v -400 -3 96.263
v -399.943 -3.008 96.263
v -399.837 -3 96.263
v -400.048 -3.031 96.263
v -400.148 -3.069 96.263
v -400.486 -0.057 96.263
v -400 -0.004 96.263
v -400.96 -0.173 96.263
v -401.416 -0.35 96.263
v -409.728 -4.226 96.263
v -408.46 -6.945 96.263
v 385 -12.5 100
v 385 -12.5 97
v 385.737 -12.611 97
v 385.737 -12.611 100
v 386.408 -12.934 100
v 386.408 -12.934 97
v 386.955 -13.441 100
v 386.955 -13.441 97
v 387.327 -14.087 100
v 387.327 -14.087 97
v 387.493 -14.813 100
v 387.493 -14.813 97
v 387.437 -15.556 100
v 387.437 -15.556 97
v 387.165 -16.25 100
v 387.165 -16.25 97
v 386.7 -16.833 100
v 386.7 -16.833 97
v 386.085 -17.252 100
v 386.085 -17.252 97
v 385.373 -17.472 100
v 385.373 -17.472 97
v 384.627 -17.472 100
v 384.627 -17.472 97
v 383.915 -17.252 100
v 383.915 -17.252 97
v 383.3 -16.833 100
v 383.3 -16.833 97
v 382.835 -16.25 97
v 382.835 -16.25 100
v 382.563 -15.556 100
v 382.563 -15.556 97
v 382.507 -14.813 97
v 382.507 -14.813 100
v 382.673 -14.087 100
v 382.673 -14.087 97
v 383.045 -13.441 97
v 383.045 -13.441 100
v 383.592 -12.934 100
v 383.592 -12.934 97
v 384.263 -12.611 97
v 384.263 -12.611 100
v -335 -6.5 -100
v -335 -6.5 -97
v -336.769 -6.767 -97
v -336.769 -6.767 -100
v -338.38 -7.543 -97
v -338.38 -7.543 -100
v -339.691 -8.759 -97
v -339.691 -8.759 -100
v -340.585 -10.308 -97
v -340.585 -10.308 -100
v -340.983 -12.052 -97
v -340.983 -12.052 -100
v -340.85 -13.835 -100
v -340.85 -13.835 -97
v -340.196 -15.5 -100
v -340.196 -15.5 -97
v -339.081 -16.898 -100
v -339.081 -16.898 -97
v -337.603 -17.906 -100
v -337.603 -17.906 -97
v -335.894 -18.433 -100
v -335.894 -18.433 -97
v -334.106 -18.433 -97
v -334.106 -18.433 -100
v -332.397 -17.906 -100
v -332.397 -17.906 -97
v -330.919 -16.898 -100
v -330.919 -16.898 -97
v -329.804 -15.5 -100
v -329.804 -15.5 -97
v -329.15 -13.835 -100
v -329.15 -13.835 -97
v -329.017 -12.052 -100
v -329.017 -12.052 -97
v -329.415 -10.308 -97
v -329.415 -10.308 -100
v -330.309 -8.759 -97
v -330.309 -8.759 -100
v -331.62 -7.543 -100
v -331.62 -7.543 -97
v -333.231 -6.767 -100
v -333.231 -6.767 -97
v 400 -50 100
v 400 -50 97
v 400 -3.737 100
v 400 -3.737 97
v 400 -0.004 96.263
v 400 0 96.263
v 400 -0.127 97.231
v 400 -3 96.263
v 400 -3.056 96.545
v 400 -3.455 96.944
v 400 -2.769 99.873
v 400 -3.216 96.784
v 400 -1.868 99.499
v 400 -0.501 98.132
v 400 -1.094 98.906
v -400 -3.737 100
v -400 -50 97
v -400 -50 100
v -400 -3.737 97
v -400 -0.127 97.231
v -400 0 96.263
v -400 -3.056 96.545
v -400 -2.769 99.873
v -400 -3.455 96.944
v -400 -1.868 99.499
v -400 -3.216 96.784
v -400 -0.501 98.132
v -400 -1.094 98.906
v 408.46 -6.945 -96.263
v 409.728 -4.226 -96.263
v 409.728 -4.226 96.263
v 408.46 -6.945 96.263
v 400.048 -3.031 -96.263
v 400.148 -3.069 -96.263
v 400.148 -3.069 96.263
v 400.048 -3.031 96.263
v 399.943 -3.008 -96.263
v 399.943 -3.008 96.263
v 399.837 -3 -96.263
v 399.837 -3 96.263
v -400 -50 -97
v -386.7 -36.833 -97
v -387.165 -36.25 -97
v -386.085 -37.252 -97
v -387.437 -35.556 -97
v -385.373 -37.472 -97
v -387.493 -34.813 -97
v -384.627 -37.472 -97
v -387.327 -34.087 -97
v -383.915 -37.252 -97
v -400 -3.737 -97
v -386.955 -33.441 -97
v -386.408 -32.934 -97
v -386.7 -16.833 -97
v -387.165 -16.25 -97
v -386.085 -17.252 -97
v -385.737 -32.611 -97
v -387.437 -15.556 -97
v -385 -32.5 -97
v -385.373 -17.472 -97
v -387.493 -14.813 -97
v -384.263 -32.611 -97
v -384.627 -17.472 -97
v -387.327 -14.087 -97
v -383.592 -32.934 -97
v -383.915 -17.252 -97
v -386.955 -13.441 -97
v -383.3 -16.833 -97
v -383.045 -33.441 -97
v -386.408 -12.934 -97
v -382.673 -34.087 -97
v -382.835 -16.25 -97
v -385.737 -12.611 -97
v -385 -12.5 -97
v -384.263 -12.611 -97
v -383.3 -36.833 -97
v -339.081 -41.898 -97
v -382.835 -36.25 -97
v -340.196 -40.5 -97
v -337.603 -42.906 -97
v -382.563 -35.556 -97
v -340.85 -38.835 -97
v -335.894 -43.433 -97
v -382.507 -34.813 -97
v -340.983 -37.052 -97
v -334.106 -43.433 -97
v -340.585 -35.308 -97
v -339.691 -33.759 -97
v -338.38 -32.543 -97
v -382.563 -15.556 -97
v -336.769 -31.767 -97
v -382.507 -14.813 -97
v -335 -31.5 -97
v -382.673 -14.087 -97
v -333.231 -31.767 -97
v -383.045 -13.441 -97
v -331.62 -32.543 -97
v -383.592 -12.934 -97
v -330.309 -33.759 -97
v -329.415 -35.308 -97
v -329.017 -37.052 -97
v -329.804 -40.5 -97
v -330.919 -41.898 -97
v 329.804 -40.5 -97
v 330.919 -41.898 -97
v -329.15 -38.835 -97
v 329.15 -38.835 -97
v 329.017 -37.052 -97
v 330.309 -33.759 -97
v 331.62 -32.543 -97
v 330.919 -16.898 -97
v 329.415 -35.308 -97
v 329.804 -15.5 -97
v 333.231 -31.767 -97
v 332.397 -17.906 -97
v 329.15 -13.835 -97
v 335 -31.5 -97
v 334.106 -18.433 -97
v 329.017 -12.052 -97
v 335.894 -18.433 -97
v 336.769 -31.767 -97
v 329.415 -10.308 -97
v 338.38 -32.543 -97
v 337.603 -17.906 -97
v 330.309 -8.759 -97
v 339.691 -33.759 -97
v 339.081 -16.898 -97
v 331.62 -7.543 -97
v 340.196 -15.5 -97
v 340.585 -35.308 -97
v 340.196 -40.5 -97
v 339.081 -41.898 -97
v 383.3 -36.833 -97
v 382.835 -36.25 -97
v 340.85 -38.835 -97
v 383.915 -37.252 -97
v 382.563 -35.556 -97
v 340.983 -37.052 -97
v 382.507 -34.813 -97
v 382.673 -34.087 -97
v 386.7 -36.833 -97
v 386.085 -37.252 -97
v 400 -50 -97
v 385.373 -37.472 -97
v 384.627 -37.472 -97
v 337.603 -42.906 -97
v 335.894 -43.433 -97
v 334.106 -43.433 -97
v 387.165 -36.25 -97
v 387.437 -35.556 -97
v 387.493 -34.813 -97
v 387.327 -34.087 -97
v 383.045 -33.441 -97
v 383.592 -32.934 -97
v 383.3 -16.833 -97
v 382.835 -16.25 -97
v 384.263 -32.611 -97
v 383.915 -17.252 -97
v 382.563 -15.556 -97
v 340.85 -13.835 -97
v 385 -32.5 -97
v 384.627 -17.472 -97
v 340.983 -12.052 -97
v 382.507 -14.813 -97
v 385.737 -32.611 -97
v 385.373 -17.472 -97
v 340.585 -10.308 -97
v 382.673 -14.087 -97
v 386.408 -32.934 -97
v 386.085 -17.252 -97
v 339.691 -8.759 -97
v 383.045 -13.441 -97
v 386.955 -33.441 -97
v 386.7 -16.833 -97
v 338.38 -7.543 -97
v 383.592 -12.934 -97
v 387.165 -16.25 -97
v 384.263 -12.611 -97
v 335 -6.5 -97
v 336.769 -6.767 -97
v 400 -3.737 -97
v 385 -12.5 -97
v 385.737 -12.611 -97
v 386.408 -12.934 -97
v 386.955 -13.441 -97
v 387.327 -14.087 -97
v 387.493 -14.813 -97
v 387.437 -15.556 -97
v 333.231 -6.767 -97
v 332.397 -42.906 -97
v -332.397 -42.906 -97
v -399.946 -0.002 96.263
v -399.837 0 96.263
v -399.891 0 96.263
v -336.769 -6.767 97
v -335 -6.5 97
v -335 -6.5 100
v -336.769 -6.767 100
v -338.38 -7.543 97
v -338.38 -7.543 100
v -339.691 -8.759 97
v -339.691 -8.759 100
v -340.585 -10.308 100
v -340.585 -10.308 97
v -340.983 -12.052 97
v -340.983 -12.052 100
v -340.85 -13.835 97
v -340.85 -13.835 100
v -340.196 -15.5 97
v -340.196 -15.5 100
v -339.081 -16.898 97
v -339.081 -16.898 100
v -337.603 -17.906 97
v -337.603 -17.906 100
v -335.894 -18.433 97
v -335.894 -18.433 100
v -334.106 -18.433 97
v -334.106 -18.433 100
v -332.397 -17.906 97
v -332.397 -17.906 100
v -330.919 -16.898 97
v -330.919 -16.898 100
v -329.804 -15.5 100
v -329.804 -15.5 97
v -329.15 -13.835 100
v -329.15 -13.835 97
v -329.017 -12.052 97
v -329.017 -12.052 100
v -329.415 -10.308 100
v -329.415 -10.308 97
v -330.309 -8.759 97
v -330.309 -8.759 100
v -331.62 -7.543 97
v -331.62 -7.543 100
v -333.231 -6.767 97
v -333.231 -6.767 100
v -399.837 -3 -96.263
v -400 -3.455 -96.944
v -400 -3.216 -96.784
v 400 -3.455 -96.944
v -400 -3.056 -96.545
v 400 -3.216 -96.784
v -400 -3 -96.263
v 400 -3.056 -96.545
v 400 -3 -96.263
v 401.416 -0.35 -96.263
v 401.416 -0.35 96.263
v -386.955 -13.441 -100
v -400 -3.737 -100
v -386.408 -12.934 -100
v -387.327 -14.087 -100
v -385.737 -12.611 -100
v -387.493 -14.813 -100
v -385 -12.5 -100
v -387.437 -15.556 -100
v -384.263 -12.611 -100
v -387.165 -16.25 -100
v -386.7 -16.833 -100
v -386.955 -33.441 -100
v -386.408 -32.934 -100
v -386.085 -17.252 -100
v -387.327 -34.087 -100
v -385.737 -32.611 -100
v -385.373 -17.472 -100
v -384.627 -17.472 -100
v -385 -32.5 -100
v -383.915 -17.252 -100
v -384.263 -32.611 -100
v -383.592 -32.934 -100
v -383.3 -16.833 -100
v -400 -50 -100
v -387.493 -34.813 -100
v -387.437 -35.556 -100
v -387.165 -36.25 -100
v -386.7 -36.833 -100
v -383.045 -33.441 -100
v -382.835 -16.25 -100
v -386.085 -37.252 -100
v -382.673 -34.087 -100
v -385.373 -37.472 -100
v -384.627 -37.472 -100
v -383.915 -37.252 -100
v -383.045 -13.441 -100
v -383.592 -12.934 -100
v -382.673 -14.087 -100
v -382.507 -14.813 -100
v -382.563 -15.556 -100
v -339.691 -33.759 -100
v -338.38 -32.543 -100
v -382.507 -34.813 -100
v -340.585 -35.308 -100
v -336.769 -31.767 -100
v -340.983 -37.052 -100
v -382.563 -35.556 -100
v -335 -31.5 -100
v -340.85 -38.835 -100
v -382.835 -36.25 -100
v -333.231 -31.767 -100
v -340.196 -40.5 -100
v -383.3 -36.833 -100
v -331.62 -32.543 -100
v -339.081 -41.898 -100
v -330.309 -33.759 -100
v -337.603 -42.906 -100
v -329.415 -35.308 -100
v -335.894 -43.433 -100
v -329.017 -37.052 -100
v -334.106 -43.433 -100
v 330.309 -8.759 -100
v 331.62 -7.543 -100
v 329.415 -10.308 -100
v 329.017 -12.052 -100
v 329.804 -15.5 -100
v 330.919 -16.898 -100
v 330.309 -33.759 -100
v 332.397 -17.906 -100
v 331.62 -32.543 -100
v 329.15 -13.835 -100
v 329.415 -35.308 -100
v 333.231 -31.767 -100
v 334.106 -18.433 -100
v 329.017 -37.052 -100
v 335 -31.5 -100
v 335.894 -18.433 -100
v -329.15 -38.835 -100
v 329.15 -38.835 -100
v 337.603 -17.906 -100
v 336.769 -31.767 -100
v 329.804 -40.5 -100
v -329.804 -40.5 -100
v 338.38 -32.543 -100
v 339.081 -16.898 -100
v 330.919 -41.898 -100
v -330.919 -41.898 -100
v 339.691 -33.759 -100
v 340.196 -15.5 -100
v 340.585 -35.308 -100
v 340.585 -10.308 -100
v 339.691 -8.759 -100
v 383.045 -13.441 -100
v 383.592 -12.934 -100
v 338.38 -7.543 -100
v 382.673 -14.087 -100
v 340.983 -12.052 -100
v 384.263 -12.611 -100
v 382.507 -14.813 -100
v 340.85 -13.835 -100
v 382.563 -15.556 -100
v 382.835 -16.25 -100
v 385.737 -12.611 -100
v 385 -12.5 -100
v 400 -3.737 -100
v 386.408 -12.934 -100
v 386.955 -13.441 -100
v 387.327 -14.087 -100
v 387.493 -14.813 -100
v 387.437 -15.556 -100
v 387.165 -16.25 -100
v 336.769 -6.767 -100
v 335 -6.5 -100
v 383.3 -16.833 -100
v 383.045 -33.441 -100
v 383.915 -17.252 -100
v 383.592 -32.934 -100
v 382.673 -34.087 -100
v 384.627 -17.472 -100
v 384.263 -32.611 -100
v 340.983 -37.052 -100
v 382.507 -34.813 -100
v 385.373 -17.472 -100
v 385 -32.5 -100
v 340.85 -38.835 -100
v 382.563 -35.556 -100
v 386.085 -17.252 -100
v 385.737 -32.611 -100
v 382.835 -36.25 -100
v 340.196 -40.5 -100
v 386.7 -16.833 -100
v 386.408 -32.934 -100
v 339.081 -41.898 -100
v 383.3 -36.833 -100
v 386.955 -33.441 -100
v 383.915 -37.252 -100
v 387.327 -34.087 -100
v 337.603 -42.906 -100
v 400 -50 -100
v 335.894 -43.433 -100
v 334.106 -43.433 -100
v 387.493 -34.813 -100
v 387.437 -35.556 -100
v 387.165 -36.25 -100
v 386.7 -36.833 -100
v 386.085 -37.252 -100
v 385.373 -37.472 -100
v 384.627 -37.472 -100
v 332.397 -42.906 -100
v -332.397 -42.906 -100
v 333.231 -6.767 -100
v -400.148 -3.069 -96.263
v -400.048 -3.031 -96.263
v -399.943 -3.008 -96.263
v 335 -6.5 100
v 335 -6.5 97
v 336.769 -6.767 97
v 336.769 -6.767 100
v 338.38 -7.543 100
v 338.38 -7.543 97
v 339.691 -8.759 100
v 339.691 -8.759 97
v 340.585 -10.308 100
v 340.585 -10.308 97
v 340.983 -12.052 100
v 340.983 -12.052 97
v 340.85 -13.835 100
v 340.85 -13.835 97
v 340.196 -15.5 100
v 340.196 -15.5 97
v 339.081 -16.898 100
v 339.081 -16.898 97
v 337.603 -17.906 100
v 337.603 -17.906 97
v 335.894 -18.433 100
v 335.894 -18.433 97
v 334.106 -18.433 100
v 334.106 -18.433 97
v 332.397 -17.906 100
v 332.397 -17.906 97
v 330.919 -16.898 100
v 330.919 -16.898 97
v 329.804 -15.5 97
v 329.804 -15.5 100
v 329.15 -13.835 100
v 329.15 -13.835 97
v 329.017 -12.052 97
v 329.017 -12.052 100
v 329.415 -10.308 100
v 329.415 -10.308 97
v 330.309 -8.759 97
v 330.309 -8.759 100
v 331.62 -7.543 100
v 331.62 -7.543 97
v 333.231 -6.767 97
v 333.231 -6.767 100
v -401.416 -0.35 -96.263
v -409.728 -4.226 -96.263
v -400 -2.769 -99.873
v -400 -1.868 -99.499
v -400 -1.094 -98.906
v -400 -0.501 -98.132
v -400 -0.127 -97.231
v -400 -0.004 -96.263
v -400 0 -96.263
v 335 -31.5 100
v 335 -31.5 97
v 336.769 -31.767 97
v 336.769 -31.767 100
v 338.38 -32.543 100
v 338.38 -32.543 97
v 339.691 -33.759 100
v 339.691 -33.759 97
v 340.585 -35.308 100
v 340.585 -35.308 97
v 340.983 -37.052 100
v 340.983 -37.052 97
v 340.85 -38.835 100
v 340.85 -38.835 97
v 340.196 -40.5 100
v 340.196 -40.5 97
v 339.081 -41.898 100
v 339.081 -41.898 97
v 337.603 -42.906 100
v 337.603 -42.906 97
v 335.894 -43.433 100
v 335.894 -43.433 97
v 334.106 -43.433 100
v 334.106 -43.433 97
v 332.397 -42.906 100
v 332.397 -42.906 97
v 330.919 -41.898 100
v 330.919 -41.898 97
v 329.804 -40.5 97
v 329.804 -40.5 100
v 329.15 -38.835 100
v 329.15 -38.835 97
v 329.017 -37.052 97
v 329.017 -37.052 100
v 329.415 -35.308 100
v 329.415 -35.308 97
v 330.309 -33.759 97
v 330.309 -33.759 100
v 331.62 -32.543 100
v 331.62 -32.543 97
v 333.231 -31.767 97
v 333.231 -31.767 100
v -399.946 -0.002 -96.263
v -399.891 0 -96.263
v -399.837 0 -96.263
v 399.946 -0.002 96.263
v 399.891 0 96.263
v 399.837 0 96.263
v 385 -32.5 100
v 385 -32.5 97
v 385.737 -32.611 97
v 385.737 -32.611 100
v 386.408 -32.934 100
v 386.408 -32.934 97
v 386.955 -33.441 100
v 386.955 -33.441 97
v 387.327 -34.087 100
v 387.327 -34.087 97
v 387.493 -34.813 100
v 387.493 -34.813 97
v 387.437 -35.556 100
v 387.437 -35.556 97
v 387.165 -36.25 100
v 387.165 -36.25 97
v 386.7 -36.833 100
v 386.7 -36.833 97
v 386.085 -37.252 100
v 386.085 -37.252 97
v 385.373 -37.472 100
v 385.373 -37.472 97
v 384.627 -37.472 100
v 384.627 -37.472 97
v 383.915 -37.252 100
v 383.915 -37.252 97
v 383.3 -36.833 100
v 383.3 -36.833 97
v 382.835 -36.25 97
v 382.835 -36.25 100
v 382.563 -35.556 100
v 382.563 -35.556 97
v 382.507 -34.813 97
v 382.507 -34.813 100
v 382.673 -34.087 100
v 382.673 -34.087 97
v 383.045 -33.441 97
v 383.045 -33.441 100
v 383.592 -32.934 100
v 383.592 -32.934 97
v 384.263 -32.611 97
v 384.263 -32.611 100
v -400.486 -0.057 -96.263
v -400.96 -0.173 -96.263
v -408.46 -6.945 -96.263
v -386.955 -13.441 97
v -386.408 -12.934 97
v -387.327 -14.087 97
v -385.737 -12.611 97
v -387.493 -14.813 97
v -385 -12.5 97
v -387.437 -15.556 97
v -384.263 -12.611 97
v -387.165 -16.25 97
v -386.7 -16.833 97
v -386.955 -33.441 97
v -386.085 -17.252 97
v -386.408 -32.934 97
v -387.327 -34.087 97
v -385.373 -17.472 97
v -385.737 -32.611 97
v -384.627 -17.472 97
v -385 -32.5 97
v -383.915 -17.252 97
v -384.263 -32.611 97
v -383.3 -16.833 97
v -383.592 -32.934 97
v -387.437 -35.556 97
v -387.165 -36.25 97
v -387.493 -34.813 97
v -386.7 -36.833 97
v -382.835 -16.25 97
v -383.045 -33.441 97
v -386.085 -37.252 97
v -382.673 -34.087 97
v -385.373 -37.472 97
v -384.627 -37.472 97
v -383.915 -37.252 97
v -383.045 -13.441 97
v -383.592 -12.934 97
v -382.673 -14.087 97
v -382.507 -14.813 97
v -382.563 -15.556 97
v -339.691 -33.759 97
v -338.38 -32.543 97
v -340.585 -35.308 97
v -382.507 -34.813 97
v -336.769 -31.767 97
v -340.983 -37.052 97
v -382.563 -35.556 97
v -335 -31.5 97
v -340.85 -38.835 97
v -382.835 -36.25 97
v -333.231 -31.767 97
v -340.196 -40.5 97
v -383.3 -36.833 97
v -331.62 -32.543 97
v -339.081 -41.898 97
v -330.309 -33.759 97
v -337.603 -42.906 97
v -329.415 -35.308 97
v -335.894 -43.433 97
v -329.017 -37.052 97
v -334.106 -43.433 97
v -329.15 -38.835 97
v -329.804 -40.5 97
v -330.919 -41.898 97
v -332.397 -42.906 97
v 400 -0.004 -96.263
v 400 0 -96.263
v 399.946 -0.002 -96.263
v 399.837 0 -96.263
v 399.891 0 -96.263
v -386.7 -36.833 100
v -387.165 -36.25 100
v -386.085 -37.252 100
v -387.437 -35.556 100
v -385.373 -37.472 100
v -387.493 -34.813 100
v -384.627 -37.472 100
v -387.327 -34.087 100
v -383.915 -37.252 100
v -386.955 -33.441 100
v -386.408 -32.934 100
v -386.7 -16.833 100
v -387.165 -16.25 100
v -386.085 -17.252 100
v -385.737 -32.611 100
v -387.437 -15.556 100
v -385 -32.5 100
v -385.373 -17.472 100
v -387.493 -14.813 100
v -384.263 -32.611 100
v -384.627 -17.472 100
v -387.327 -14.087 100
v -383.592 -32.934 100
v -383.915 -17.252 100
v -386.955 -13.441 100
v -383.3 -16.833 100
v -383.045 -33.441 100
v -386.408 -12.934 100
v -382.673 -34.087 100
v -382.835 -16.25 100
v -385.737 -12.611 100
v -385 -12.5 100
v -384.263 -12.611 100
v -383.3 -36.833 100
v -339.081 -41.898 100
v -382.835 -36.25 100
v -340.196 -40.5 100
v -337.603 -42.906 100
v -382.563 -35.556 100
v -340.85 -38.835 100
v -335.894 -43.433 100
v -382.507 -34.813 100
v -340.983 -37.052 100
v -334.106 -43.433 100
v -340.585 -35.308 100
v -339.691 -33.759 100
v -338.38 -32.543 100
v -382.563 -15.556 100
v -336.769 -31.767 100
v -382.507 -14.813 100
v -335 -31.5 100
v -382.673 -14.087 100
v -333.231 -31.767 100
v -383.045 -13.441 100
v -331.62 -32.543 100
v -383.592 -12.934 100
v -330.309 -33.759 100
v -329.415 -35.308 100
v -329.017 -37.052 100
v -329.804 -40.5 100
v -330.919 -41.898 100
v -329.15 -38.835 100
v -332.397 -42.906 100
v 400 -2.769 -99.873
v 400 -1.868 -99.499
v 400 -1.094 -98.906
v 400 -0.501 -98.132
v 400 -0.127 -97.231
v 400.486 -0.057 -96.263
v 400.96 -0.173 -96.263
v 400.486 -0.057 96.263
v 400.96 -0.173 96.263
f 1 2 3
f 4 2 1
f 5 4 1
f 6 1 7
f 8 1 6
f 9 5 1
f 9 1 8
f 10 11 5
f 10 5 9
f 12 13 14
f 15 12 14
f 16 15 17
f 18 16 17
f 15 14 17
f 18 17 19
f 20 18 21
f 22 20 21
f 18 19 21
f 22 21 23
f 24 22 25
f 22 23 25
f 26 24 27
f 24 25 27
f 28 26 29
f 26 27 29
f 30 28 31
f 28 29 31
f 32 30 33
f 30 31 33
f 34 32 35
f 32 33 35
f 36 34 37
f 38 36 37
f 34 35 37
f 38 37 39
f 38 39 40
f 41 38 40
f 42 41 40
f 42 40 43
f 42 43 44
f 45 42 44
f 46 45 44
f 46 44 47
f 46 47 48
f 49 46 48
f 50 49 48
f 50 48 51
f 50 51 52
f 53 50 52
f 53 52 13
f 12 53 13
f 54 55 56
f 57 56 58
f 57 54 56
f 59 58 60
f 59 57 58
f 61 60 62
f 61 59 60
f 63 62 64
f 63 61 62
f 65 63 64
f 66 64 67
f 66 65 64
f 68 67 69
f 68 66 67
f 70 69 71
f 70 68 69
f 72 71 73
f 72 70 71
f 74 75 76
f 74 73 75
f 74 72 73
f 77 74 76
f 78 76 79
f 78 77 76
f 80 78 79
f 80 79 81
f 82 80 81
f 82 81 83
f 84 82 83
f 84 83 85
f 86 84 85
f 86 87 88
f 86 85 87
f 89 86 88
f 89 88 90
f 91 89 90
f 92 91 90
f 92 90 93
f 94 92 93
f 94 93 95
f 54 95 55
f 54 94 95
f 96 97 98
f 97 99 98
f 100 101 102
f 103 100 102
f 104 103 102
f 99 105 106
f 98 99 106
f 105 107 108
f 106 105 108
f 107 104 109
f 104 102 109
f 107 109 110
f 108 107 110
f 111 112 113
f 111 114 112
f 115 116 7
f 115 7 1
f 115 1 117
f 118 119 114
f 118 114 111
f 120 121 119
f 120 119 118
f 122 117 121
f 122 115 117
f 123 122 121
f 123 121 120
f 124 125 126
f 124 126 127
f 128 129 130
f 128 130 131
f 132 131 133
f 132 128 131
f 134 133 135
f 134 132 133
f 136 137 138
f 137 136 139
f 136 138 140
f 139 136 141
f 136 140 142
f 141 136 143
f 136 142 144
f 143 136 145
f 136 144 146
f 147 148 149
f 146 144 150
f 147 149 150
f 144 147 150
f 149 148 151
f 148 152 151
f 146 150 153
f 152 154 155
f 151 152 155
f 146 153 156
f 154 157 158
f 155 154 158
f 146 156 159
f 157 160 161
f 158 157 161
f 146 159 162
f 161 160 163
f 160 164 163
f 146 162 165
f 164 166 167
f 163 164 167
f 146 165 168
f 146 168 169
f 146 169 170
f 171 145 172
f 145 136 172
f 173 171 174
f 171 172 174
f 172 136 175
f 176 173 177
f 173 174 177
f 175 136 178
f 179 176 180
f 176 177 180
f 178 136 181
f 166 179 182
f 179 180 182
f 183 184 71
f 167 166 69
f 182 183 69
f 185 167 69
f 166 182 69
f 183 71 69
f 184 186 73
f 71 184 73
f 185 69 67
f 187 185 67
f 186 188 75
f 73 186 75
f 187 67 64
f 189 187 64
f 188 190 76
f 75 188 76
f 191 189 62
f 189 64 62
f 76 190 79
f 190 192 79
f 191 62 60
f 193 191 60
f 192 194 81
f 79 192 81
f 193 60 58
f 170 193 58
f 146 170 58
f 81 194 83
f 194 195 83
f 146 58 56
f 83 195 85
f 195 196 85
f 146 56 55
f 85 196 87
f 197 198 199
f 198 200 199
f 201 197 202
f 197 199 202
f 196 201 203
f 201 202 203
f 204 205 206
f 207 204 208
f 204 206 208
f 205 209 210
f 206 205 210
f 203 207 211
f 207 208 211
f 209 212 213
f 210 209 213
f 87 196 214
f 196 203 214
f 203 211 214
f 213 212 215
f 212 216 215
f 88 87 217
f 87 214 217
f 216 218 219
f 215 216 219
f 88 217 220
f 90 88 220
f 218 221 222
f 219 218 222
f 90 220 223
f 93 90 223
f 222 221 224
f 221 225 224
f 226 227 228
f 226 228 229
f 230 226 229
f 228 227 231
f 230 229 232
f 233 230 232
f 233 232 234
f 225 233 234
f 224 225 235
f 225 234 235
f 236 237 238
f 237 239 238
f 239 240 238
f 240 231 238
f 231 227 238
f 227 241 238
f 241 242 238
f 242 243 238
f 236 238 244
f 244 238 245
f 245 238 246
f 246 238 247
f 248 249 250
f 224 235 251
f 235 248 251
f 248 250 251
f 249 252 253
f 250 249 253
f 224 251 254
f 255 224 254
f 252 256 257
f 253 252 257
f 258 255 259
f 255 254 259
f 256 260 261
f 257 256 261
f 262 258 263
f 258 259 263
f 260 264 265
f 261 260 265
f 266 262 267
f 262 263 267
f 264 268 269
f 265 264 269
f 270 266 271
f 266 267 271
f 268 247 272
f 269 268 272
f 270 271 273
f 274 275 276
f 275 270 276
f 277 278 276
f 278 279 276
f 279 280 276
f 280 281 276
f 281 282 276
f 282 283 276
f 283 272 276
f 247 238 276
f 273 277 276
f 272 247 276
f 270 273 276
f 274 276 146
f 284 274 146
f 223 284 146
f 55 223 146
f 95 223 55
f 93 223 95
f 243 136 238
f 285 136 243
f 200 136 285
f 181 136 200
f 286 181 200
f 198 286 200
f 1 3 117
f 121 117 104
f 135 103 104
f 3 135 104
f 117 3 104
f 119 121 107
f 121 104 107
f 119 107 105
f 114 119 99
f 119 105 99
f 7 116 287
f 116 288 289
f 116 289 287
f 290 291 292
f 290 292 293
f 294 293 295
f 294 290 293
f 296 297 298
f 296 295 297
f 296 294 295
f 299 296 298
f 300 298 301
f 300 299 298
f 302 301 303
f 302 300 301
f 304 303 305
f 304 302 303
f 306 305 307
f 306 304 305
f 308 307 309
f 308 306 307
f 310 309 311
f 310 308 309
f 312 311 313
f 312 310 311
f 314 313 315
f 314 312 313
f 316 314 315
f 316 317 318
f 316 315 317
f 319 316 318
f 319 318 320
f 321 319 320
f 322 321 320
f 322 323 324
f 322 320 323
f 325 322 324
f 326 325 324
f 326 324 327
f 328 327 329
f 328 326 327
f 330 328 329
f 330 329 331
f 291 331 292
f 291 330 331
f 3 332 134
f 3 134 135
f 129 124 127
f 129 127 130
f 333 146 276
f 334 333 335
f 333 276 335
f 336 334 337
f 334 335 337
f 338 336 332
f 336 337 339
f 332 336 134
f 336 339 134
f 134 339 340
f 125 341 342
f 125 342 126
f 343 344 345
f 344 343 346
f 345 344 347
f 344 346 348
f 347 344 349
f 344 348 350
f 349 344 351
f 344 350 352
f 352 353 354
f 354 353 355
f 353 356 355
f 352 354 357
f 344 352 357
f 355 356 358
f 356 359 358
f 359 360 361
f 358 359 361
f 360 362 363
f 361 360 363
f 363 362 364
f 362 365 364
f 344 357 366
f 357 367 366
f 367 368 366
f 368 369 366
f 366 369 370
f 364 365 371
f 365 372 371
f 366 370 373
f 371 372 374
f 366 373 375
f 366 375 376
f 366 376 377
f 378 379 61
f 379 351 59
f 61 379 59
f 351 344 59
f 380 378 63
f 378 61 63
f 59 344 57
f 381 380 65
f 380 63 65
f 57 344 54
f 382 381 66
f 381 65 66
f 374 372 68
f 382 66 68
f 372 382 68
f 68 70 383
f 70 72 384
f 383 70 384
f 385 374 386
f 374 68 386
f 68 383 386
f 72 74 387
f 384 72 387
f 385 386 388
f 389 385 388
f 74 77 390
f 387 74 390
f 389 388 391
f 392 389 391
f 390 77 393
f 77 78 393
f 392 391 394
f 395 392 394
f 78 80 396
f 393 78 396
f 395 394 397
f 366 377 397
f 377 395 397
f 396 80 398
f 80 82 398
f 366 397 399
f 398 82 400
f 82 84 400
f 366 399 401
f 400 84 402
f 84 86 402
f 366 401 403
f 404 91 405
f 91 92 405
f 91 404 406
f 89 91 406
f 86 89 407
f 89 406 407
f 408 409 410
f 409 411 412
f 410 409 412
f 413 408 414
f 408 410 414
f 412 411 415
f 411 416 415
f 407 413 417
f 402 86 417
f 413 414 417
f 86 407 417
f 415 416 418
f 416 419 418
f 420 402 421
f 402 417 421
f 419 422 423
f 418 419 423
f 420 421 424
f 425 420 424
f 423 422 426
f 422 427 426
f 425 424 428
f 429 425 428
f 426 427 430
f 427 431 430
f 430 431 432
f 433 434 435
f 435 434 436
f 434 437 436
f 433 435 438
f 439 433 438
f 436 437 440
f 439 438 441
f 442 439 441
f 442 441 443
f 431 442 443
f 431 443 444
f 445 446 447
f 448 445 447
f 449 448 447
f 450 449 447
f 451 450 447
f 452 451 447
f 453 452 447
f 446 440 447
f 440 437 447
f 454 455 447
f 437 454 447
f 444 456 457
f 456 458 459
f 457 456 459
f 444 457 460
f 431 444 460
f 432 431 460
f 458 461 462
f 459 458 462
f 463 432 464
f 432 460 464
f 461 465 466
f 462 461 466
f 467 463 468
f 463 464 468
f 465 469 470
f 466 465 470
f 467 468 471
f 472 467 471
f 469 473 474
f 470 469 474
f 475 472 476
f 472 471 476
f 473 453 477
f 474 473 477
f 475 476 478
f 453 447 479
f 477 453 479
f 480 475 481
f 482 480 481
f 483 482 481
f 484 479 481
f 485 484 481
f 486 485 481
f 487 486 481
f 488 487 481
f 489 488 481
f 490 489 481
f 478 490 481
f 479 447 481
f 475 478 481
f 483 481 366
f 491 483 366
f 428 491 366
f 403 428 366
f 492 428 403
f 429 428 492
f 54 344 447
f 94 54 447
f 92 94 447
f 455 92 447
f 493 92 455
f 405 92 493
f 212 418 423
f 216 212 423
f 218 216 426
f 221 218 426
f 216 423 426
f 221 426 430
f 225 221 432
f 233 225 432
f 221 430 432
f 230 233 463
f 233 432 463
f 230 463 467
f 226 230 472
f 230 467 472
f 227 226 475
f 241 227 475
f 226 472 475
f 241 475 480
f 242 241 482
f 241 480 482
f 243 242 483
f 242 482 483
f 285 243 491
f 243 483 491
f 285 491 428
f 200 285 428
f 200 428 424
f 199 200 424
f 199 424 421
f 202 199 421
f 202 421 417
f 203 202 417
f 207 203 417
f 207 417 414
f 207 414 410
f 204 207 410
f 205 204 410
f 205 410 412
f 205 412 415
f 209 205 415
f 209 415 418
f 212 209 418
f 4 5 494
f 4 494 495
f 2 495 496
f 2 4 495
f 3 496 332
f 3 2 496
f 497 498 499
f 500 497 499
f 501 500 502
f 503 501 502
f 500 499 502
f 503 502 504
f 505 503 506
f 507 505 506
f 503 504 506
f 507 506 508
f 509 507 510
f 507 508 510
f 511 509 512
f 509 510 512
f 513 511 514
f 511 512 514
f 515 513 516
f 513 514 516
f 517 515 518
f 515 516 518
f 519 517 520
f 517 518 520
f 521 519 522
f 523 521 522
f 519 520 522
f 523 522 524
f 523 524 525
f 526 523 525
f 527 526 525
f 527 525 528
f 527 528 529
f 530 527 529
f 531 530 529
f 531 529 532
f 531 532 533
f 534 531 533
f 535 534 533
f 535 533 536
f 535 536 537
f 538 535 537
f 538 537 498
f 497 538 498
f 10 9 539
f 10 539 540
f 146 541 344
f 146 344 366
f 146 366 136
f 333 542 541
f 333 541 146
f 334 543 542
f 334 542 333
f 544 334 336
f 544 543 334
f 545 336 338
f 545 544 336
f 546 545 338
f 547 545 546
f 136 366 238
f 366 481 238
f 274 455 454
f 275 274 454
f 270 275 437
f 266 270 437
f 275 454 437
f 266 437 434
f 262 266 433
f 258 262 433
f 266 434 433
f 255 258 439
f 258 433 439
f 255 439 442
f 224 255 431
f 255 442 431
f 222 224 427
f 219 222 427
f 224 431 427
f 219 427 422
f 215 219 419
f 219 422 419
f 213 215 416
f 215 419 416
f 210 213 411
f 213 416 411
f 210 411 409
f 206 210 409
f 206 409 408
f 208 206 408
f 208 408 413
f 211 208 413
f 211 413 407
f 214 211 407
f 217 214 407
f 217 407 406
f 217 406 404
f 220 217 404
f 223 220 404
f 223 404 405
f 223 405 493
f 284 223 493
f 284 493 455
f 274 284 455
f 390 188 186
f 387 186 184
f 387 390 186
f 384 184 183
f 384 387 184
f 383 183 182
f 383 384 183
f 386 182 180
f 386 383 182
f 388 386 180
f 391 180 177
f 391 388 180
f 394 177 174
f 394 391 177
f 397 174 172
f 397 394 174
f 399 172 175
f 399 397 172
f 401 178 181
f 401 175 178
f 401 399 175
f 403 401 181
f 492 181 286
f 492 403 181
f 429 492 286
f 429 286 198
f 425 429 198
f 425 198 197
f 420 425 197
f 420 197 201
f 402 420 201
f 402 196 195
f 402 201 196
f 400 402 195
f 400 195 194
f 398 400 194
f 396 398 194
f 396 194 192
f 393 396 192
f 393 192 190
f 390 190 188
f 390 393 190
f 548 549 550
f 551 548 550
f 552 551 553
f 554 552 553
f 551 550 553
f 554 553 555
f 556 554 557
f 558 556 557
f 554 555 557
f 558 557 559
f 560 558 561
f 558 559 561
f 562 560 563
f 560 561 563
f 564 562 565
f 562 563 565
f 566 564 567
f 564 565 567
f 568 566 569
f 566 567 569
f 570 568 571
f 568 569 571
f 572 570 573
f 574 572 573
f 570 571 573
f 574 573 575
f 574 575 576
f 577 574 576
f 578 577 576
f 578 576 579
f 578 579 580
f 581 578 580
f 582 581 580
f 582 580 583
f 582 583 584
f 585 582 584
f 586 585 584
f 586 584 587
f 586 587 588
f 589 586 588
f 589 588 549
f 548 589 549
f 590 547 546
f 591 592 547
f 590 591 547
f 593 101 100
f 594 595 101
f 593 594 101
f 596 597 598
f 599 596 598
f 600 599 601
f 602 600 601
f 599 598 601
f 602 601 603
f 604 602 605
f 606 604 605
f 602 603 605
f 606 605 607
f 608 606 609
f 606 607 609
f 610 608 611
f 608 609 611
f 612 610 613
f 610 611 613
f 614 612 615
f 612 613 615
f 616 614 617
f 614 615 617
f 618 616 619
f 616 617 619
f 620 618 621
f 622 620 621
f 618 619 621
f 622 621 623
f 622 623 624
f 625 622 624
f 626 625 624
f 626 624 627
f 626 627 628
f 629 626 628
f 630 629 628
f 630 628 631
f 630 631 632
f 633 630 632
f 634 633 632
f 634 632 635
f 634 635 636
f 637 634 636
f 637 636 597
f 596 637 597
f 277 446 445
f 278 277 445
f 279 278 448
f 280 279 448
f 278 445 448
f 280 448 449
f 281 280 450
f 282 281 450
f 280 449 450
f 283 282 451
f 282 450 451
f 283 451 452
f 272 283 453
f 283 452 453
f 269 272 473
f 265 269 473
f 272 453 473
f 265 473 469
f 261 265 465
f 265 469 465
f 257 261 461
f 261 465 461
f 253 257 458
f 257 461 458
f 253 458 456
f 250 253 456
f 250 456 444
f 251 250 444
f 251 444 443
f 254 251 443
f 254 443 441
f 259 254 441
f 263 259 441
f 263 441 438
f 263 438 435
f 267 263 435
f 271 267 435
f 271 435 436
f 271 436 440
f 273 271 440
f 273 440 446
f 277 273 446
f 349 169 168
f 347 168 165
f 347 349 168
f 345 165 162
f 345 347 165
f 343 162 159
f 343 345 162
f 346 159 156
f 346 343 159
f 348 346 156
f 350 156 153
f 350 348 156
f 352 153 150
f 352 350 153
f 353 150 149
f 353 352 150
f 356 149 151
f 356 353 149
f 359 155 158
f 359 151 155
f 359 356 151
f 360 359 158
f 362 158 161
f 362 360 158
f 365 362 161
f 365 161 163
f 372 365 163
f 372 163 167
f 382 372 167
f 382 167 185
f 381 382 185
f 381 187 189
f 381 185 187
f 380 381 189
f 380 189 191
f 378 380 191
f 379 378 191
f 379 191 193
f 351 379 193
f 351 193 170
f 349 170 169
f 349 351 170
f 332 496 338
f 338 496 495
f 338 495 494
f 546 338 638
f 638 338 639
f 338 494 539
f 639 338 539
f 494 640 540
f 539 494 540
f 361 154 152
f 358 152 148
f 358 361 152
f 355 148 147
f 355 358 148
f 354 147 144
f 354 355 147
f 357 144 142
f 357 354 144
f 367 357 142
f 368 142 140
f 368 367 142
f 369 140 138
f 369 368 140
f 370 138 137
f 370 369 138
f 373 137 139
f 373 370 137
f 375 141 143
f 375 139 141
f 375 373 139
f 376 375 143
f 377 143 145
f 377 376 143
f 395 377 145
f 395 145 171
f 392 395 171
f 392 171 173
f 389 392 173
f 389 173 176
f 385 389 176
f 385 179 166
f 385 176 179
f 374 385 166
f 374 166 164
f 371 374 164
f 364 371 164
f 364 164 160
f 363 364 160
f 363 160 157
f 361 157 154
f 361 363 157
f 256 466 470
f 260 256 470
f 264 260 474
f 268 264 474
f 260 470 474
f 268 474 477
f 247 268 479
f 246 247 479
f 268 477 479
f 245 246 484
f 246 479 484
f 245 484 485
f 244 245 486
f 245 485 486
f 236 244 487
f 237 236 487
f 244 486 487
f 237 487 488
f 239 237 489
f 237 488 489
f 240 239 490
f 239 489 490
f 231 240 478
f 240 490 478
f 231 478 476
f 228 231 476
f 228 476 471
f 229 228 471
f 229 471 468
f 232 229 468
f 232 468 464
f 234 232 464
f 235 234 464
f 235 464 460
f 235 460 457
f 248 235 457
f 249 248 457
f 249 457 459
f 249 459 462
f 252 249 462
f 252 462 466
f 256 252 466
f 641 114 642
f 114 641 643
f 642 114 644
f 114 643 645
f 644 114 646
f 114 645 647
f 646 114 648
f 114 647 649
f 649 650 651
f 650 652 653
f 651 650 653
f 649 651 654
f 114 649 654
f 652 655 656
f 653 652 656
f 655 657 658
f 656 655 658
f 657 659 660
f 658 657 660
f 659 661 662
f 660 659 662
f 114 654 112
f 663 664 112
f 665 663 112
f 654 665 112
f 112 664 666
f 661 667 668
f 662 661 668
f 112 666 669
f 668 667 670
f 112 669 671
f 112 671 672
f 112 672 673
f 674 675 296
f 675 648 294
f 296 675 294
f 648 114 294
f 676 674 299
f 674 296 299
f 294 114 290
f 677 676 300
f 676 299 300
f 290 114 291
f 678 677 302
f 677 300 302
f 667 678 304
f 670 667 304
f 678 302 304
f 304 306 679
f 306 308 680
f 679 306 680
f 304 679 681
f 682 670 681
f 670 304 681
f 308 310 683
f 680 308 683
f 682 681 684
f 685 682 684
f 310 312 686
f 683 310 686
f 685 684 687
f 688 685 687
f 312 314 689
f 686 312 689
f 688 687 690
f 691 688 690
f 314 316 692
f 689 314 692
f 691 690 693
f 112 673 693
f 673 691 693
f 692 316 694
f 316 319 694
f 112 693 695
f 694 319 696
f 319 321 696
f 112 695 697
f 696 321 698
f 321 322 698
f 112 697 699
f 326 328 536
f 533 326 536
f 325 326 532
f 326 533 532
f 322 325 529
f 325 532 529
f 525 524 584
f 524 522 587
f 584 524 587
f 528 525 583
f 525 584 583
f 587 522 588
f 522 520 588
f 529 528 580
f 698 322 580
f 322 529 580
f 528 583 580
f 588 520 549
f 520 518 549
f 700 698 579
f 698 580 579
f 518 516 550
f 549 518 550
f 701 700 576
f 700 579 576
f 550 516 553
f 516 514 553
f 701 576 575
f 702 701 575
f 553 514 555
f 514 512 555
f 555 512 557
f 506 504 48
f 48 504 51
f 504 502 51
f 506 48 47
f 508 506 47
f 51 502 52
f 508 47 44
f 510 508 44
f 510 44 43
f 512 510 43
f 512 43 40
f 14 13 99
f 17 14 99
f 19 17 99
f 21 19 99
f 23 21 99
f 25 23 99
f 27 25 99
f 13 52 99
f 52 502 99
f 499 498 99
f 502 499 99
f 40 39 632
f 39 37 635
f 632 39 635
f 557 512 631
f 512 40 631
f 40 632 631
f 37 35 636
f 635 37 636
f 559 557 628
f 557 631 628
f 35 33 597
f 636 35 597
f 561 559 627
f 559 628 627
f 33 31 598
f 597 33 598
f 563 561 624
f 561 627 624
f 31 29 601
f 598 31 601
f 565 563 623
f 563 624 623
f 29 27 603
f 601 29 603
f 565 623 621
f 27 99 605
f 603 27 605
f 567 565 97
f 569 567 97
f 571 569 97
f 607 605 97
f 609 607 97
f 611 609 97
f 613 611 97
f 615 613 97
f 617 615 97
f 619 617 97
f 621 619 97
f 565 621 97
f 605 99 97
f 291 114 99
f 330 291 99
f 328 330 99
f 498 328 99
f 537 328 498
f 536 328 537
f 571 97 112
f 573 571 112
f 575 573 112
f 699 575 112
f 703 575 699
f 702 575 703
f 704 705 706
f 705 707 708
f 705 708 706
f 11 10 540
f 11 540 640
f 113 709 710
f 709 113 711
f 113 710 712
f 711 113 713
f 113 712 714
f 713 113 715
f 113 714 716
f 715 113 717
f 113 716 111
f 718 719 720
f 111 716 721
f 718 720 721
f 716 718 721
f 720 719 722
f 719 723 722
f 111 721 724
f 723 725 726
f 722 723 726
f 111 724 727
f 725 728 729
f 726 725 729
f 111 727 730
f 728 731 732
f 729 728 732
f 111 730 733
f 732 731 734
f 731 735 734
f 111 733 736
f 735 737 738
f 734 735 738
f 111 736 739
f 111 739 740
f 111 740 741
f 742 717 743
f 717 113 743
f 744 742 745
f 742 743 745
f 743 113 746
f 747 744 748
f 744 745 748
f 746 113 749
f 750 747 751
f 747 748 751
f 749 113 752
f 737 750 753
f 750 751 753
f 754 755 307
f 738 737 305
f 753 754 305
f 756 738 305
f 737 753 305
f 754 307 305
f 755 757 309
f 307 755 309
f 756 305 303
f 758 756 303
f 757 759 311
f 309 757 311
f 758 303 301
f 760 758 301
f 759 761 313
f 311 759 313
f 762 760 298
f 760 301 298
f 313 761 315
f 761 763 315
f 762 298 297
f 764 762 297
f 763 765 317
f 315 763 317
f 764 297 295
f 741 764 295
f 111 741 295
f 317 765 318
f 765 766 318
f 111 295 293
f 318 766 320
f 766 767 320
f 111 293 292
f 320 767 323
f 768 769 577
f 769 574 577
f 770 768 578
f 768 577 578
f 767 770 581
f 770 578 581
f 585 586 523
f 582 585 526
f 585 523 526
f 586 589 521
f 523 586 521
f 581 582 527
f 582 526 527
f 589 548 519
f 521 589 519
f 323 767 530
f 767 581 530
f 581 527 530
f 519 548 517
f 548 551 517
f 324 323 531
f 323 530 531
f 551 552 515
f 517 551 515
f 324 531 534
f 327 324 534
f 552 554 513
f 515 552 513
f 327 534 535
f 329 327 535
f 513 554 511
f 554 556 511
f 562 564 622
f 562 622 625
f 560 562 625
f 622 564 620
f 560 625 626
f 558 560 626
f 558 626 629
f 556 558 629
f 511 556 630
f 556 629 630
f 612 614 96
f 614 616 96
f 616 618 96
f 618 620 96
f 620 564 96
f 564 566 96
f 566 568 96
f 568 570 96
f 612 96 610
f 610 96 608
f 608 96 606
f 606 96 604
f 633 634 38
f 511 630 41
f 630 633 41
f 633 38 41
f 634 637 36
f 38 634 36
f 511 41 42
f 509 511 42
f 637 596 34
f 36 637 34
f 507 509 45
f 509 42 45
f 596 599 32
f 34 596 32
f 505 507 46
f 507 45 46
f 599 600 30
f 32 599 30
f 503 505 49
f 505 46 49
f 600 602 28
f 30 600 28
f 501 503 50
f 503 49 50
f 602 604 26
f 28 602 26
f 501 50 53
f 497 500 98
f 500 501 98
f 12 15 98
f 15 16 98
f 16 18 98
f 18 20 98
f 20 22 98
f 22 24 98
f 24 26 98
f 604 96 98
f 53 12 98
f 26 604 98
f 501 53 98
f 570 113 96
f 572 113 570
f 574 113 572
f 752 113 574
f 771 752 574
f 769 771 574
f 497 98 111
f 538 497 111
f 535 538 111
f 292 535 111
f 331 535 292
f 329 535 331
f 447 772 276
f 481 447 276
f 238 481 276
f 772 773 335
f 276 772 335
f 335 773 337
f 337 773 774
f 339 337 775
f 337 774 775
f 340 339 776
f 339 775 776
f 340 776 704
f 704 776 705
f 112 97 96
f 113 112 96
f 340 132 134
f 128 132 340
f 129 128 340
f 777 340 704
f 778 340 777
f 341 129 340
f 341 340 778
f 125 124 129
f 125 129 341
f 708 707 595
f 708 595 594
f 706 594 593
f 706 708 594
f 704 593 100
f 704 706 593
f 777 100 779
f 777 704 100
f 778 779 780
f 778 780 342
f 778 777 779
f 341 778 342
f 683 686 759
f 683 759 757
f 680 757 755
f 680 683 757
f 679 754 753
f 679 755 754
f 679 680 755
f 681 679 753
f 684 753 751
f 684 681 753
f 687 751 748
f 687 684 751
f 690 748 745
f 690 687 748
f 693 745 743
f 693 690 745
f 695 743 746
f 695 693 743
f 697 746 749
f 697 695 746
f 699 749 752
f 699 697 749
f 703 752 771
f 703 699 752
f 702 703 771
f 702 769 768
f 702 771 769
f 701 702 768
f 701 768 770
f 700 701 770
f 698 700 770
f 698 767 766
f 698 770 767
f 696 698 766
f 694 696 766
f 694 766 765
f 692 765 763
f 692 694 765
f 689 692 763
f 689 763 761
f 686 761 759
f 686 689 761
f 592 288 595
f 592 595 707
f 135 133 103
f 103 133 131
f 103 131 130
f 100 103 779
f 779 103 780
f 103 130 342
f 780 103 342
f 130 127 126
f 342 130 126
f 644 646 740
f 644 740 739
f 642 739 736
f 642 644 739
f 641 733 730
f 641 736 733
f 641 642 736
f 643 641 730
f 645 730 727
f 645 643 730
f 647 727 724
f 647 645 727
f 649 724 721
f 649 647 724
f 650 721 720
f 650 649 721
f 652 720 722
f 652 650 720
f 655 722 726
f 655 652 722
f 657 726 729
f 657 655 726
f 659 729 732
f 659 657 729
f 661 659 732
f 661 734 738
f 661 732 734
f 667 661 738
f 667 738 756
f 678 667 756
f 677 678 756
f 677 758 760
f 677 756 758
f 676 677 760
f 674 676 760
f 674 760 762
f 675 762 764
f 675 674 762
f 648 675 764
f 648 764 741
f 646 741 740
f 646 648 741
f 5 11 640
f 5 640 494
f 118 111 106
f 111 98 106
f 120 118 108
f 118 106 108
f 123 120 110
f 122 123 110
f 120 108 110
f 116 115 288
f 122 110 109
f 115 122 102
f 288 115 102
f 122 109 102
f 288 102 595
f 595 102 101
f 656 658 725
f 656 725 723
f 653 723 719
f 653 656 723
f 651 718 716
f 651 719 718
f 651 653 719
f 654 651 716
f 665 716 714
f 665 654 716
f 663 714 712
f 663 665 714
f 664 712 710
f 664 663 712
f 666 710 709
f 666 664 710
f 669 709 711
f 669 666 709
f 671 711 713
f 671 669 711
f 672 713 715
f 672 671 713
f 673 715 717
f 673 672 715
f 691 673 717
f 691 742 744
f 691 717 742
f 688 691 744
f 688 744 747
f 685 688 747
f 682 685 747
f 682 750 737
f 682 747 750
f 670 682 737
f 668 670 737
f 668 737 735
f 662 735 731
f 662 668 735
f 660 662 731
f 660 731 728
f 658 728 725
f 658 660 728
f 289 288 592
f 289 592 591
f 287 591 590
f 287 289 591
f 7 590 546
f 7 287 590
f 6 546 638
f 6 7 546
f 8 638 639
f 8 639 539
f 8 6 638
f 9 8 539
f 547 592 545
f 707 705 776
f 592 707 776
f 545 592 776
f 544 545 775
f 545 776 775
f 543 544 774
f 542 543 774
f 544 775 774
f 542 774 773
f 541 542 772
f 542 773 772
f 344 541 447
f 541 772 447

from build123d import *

# Parameters (mm, degrees)
BASE_FLANGE1_DEPTH             = 400
SKETCH6_R                      = 2.5
CUT_EXTRUDE2_DEPTH             = 451
SKETCH10_R                     = 6
CUT_EXTRUDE1_DEPTH             = 451
KENAR_FLAN_1_STRIP_CUT_DEPTH   = 192.5268
KENAR_FLAN_1_STRIP_CUT_2_DEPTH = 192.5268
KENAR_FLAN_1_DEPTH             = 192.5268
KENAR_FLAN_1_BEND_DEPTH        = 192.5268


# Sheet-metal steps are written as plain solids
with BuildPart() as part:
    # Sketch1 → Base-Flange1 (new, symmetric)
    with BuildSketch(Plane(origin=(0, 0, 0), x_dir=(0, 0, -1), z_dir=(1, 0, 0))):
        with BuildLine():
            Line((-100, -50), (-100, -3.7366))
            ThreePointArc((-100, -3.7366), (-98.905575199, -1.094424801), (-96.2634, 0))
            Line((-96.2634, 0), (96.2634, 0))
            ThreePointArc((96.2634, 0), (98.905575199, -1.094424801), (100, -3.7366))
            Line((100, -3.7366), (100, -50))
            Line((100, -50), (97, -50))
            Line((97, -50), (97, -3.7366))
            ThreePointArc((97, -3.7366), (96.784254855, -3.215745145), (96.2634, -3))
            Line((96.2634, -3), (-96.2634, -3))
            ThreePointArc((-96.2634, -3), (-96.784254855, -3.215745145), (-97, -3.7366))
            Line((-97, -3.7366), (-97, -50))
            Line((-97, -50), (-100, -50))
        make_face()
    extrude(amount=BASE_FLANGE1_DEPTH, both=True)

    # Sketch6 → Cut-Extrude2 (cut, through all)
    with BuildSketch(Plane(origin=(0, 0, -100), x_dir=(-1, 0, 0), z_dir=(0, 0, -1))):
        with Locations(Location((-385, -15, 0), (0, 0, 90))):
            Circle(SKETCH6_R)
        with Locations(Location((-385, -35, 0), (0, 0, 90))):
            Circle(SKETCH6_R)
    cut_extrude2 = extrude(amount=-CUT_EXTRUDE2_DEPTH, mode=Mode.SUBTRACT)

    # Sketch10 → Cut-Extrude1 (cut, through all)
    with BuildSketch(Plane(origin=(0, 0, -100), x_dir=(-1, 0, 0), z_dir=(0, 0, -1))):
        with Locations(Location((-335, -12.5, 0), (0, 0, 90))):
            Circle(SKETCH10_R)
        with Locations(Location((-335, -37.5, 0), (0, 0, 90))):
            Circle(SKETCH10_R)
    cut_extrude1 = extrude(amount=-CUT_EXTRUDE1_DEPTH, mode=Mode.SUBTRACT)

    # Kenar-Flanş1 strip (across the edge) → Kenar-Flanş1 strip cut (cut)
    with BuildSketch(Plane(origin=(400, -3, -96.2634), x_dir=(-0.42261826174069383, -0.9063077870366526, 0), z_dir=(0, 0, 1))):
        Polygon((-8.343930041, 10.795010968), (-2.649909677, -1.415855108), (0.069013684, -0.148000323), (-5.62500668, 12.062865753), align=None)
    extrude(amount=KENAR_FLAN_1_STRIP_CUT_DEPTH, mode=Mode.SUBTRACT)

    # Kenar-Flanş1 strip 2 (across the edge) → Kenar-Flanş1 strip cut 2 (cut)
    with BuildSketch(Plane(origin=(-400, -3, 96.2634), x_dir=(0.42261826174069383, -0.9063077870366526, 0), z_dir=(0, 0, -1))):
        Polygon((-8.343930041, 10.795010968), (-2.649909677, -1.415855108), (0.069013684, -0.148000323), (-5.62500668, 12.062865753), align=None)
    extrude(amount=KENAR_FLAN_1_STRIP_CUT_2_DEPTH, mode=Mode.SUBTRACT)

    # Kenar-Flanş1 section (across the edge) → Kenar-Flanş1 (add)
    with BuildSketch(Plane(origin=(400, -3, -96.2634), x_dir=(-0.42261826174069383, -0.9063077870366526, 0), z_dir=(0, 0, 1))):
        with BuildLine():
            Line((-3, 0.163300289), (-3, 9.334916012))
            Line((-3, 9.334916012), (0, 9.334916012))
            Line((0, 9.334916012), (0, 0.163300289))
            ThreePointArc((0, 0.163300289), (0.017460361, 0.003870869), (0.069013684, -0.148000323))
            Line((0.069013684, -0.148000323), (-2.649909677, -1.415855108))
            ThreePointArc((-2.649909677, -1.415855108), (-2.91142766, -0.645447973), (-3, 0.163300289))
        make_face()
    extrude(amount=KENAR_FLAN_1_DEPTH)

    # Kenar-Flanş1 section 2 (across the edge) → Kenar-Flanş1 bend (add)
    with BuildSketch(Plane(origin=(-400, -3, 96.2634), x_dir=(0.42261826174069383, -0.9063077870366526, 0), z_dir=(0, 0, -1))):
        with BuildLine():
            Line((-3, 0.163300289), (-3, 9.334916012))
            Line((-3, 9.334916012), (0, 9.334916012))
            Line((0, 9.334916012), (0, 0.163300289))
            ThreePointArc((0, 0.163300289), (0.017460361, 0.003870869), (0.069013684, -0.148000323))
            Line((0.069013684, -0.148000323), (-2.649909677, -1.415855108))
            ThreePointArc((-2.649909677, -1.415855108), (-2.91142766, -0.645447973), (-3, 0.163300289))
        make_face()
    extrude(amount=KENAR_FLAN_1_BEND_DEPTH)

    # Mirror1: Cut-Extrude2, Cut-Extrude1 across plane
    add(cut_extrude2.mirror(Plane(origin=(0, 0, 0), x_dir=(0, 0, 1), z_dir=(1, 0, 0))), mode=Mode.SUBTRACT)
    add(cut_extrude1.mirror(Plane(origin=(0, 0, 0), x_dir=(0, 0, 1), z_dir=(1, 0, 0))), mode=Mode.SUBTRACT)


solid = part.part
